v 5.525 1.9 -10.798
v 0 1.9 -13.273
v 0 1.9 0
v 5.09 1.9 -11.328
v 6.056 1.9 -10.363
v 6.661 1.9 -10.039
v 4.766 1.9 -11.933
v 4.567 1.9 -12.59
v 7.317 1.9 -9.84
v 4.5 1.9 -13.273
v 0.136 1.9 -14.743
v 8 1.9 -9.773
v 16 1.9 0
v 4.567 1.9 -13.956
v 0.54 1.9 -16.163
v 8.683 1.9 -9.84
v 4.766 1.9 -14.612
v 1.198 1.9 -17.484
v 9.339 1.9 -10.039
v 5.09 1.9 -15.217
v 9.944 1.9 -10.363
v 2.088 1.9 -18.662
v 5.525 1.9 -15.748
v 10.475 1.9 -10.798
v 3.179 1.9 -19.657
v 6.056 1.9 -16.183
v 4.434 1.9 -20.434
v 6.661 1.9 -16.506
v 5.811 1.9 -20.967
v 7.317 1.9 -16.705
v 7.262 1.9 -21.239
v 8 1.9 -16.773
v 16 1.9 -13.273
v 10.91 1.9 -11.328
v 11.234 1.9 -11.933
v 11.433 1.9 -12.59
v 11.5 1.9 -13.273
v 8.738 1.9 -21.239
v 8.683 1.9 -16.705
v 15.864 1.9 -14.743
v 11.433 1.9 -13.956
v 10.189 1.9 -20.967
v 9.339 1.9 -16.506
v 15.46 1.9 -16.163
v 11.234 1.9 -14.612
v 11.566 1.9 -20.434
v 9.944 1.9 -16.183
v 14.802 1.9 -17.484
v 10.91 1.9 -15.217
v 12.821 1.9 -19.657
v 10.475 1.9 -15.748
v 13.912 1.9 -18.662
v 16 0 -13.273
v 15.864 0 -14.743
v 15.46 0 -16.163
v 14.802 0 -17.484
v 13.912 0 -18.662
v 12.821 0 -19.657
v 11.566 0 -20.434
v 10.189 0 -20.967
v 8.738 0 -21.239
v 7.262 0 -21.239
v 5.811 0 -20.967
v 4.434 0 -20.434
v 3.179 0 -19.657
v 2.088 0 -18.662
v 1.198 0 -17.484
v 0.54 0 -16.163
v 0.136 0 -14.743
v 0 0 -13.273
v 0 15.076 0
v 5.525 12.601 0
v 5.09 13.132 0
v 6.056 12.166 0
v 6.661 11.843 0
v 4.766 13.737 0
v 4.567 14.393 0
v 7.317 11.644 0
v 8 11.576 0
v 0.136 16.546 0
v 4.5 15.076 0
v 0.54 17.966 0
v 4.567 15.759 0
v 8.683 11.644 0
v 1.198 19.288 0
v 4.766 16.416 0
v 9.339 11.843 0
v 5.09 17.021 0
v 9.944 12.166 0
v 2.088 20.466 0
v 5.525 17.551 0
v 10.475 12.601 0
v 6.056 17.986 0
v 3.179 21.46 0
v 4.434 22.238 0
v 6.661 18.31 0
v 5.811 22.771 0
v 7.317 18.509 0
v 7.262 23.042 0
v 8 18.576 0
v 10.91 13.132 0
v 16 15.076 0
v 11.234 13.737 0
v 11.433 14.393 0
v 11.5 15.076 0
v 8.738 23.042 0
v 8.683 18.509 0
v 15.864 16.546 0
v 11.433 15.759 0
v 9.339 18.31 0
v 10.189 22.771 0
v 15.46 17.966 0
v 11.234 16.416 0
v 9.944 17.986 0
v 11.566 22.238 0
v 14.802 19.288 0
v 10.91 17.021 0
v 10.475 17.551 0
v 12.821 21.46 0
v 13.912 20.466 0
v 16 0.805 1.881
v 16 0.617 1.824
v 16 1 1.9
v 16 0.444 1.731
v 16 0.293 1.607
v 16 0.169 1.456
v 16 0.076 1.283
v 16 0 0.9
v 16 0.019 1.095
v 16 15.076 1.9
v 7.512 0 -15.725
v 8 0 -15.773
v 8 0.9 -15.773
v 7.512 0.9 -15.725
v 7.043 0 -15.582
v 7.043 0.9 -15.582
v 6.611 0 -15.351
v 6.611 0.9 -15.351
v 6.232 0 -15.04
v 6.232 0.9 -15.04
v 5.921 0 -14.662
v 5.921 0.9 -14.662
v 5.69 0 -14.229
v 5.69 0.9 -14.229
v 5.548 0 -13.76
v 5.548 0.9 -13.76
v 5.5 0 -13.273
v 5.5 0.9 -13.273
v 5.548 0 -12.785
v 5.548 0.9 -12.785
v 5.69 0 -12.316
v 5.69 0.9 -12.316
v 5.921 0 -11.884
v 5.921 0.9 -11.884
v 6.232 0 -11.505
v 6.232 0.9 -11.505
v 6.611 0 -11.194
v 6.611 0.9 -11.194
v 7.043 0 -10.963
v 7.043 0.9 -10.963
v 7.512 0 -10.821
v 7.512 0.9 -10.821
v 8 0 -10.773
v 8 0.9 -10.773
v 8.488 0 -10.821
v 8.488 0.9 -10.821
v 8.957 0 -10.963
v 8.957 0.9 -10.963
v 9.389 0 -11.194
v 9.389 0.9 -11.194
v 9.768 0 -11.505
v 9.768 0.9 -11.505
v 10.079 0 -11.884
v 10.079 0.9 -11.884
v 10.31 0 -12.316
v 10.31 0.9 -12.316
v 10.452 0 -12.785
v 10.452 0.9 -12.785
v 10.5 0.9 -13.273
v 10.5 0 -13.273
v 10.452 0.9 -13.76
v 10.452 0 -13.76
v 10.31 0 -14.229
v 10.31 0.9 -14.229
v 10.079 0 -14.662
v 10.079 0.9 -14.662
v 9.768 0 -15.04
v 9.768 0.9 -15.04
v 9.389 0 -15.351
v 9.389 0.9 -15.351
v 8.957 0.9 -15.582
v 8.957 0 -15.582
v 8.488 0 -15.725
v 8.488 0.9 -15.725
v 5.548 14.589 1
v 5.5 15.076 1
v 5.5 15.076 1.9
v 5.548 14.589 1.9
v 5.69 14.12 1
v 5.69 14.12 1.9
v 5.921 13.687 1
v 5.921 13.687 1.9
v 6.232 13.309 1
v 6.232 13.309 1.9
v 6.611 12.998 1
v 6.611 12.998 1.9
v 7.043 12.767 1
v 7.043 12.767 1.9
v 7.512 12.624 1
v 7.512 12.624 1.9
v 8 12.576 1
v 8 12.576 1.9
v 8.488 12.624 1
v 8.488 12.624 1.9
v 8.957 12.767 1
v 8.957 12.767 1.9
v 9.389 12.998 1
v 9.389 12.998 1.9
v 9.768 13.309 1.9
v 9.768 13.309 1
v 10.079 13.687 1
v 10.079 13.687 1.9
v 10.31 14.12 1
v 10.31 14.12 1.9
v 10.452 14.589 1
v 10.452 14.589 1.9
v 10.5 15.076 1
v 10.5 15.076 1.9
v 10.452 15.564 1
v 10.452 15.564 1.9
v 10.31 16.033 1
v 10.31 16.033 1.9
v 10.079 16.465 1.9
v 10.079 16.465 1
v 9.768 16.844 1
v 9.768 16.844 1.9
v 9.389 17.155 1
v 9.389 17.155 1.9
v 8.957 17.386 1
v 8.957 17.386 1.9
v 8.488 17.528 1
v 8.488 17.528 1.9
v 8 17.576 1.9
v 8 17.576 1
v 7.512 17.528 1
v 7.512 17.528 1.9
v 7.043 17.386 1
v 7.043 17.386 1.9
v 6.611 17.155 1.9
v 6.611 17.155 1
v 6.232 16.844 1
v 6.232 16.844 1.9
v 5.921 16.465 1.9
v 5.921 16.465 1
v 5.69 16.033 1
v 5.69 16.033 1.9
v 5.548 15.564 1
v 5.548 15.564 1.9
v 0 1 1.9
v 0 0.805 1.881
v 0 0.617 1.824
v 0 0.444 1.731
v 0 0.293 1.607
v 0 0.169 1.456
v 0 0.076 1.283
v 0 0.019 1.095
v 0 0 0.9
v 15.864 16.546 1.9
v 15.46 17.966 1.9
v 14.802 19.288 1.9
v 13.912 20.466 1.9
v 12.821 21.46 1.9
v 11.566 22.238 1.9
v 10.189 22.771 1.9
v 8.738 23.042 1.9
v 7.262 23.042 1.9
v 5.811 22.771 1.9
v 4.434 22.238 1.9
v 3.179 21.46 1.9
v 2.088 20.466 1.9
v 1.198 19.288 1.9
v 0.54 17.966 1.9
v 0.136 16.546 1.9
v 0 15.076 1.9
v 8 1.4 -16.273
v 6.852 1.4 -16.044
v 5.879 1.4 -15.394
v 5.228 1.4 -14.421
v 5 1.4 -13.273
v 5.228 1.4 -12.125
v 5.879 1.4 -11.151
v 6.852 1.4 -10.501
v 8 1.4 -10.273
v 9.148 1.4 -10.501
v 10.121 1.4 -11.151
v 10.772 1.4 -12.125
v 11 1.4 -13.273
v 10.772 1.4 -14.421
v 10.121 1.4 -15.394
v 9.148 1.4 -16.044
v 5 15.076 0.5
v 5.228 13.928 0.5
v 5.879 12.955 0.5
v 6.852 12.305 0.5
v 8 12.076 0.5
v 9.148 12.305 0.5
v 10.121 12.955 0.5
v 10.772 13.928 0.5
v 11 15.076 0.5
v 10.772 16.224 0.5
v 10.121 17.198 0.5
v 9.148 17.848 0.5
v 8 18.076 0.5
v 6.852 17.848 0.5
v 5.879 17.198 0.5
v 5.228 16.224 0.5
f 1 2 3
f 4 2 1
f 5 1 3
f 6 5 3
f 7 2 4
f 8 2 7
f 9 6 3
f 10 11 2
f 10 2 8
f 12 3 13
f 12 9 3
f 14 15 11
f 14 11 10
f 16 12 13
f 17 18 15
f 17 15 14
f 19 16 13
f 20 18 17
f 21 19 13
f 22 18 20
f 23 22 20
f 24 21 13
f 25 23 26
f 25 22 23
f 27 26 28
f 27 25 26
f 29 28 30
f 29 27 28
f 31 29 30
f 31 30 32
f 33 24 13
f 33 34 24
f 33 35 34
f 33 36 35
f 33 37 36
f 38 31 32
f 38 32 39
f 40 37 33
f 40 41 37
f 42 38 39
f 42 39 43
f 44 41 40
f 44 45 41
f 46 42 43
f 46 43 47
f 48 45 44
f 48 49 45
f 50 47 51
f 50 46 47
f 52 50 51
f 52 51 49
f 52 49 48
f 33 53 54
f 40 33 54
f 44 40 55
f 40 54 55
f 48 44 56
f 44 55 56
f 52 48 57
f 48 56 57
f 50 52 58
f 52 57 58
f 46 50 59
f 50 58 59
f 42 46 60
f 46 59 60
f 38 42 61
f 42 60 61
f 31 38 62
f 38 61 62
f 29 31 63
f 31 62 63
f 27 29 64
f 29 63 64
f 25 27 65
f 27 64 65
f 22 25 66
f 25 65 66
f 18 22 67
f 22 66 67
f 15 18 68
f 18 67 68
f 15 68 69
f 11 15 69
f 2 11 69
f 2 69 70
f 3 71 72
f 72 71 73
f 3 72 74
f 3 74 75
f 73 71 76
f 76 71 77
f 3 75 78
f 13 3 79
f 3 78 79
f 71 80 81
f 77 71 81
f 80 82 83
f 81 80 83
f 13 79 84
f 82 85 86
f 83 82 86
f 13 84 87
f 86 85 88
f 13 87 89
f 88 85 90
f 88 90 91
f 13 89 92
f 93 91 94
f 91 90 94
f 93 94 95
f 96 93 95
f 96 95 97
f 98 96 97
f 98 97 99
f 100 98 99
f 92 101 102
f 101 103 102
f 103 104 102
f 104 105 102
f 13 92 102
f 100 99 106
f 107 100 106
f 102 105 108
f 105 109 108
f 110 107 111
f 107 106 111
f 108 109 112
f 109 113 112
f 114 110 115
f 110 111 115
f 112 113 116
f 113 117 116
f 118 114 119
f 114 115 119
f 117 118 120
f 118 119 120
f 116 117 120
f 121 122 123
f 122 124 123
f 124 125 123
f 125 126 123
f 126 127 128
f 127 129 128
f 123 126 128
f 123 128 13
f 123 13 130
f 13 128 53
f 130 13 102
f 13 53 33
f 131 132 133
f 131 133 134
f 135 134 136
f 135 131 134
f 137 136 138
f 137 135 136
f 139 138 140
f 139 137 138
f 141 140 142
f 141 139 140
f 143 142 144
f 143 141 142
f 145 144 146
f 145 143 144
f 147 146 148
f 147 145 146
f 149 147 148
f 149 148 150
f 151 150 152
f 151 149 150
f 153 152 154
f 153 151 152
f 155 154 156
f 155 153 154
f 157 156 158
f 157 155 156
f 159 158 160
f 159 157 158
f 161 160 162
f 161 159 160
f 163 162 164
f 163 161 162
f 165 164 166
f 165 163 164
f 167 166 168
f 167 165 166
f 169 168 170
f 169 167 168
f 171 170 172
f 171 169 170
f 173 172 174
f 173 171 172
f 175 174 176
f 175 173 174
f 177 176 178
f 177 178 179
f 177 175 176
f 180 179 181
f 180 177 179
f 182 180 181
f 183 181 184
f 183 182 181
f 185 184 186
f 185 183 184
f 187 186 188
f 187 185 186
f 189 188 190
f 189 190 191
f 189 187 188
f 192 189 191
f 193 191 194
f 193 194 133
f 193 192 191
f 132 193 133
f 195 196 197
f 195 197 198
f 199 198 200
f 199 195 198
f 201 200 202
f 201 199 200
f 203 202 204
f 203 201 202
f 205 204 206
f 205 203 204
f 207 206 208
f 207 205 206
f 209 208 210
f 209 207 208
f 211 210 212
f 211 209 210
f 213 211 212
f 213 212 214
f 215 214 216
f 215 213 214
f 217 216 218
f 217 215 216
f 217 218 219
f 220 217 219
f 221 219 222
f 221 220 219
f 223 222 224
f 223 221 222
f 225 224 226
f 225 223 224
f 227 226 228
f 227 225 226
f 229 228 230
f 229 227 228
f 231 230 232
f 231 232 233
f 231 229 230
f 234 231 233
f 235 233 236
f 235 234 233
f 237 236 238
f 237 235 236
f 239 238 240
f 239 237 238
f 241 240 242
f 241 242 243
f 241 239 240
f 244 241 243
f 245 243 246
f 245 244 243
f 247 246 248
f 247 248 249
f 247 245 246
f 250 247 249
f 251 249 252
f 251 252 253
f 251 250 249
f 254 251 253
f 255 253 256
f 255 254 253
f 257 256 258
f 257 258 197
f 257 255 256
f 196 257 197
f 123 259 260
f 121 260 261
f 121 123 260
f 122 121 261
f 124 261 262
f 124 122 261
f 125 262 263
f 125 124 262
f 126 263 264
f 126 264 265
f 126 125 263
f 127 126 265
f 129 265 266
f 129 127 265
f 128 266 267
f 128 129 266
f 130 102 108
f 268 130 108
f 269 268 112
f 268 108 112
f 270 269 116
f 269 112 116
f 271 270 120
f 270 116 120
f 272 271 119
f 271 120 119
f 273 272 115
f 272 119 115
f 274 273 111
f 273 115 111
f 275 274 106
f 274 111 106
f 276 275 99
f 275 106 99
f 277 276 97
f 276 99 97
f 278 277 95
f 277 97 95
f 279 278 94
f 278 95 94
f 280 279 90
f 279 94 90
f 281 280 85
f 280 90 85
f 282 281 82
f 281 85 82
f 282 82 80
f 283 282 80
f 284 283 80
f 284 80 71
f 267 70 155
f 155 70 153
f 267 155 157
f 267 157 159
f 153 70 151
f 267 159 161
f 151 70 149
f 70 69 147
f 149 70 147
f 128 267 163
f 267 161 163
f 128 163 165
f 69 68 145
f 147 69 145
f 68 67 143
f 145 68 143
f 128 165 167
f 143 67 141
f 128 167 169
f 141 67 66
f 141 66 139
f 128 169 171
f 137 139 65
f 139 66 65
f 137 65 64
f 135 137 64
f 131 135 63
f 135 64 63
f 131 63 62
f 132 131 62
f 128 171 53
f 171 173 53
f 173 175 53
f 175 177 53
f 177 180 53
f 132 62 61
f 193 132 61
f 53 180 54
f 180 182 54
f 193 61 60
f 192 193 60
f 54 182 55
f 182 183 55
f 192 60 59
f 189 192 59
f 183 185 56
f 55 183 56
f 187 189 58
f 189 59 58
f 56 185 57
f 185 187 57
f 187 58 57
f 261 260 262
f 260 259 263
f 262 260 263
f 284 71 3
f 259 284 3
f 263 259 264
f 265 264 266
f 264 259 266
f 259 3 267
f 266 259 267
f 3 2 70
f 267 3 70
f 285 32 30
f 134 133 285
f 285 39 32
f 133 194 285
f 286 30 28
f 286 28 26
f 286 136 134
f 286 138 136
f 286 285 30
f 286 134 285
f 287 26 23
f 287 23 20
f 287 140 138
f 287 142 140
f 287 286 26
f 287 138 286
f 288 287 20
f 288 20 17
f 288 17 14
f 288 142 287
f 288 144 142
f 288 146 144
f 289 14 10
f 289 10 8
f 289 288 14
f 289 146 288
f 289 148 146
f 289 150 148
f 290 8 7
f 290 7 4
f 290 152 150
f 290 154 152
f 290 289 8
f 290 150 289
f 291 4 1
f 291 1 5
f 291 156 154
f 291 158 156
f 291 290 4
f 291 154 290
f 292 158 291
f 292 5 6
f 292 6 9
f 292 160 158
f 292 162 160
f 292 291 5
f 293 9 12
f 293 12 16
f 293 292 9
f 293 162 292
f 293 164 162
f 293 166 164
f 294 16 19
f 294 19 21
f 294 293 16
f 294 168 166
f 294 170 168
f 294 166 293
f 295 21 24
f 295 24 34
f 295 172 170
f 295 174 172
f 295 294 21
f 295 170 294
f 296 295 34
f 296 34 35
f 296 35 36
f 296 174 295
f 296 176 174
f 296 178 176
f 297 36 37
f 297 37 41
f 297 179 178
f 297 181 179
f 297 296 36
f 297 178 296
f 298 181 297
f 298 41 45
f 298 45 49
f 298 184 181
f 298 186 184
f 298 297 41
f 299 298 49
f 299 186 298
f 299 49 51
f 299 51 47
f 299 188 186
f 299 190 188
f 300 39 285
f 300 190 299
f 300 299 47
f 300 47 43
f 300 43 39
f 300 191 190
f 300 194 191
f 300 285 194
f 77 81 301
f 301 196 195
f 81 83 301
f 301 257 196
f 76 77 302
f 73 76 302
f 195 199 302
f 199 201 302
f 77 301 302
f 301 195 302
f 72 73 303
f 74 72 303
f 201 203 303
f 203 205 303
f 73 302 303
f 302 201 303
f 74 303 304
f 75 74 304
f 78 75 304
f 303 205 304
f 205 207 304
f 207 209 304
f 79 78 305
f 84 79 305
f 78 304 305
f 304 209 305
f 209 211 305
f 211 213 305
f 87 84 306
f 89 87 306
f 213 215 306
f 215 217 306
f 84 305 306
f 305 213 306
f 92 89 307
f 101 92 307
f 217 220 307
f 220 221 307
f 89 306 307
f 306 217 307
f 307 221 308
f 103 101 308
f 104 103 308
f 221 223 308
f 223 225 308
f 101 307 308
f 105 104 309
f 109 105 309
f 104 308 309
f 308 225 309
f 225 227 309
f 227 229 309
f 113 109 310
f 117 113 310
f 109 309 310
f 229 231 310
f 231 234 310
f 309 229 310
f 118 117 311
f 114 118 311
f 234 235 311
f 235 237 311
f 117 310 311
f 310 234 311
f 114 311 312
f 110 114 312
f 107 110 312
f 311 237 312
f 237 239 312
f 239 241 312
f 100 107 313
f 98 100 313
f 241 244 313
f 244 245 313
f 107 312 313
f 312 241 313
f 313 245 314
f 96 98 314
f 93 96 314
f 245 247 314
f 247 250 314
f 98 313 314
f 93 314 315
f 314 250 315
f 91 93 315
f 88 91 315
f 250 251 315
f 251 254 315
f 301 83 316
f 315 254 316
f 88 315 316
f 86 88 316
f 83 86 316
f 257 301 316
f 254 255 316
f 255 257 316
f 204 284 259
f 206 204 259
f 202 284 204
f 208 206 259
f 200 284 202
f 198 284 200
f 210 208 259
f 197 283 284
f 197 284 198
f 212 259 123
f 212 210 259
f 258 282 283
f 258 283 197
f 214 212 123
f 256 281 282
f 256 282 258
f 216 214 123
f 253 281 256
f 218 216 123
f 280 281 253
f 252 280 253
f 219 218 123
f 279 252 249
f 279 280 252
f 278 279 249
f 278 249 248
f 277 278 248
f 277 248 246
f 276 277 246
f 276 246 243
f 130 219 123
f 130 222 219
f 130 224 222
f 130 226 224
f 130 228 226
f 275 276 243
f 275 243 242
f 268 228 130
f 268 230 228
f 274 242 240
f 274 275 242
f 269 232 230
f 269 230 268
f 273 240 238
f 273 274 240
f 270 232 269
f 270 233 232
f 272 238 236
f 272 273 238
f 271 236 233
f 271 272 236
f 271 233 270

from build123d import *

# Parameters (mm, degrees)
SKETCH_1_R      = 2.5
EXTRUDE_1_DEPTH = 1.9
SKETCH_3_R      = 2.5
EXTRUDE_2_DEPTH = 1.9
FILLET_1_R      = 1
CHAMFER_1_SIZE  = 1


with BuildPart() as part:
    # 草图1 → 凸台-拉伸1 (new body)
    with BuildSketch(Plane.XY):
        with BuildLine():
            Line((0, 15.076269086), (0, 0))
            Line((0, 0), (16, 0))
            Line((16, 0), (16, 15.076269086))
            ThreePointArc((16, 15.076269086), (8, 23.076269086), (0, 15.076269086))
        make_face()
        with Locations(Location((8, 15.076269086, 0), (0, 0, 180))):
            Circle(SKETCH_1_R, mode=Mode.SUBTRACT)
    extrude(amount=EXTRUDE_1_DEPTH)

    # 草图3 → 凸台-拉伸2 (add)
    with BuildSketch(Plane(origin=(0, 0, 0), x_dir=(1, 0, 0), z_dir=(0, 1, 0))):
        with BuildLine():
            Line((0, -1.9), (16, -1.9))
            Line((16, -1.9), (16, 13.272714332))
            ThreePointArc((16, 13.272714332), (8, 21.272714332), (0, 13.272714332))
            Line((0, 13.272714332), (0, -1.9))
        make_face()
        with Locations(Location((8, 13.272714332, 0), (0, 0, 90))):
            Circle(SKETCH_3_R, mode=Mode.SUBTRACT)
    extrude(amount=EXTRUDE_2_DEPTH)

    # 圆角1
    fillet_1_edges = [part.edges().sort_by_distance(p)[0] for p in [
        (8, 0, 1.9),
    ]]
    fillet(fillet_1_edges, radius=FILLET_1_R)

    # 倒角1
    chamfer_1_edges = [part.edges().sort_by_distance(p)[0] for p in [
        (8, 1.9, -10.772714332),
        (10.5, 15.076269086, 0),
    ]]
    chamfer(chamfer_1_edges, length=CHAMFER_1_SIZE)


solid = part.part
